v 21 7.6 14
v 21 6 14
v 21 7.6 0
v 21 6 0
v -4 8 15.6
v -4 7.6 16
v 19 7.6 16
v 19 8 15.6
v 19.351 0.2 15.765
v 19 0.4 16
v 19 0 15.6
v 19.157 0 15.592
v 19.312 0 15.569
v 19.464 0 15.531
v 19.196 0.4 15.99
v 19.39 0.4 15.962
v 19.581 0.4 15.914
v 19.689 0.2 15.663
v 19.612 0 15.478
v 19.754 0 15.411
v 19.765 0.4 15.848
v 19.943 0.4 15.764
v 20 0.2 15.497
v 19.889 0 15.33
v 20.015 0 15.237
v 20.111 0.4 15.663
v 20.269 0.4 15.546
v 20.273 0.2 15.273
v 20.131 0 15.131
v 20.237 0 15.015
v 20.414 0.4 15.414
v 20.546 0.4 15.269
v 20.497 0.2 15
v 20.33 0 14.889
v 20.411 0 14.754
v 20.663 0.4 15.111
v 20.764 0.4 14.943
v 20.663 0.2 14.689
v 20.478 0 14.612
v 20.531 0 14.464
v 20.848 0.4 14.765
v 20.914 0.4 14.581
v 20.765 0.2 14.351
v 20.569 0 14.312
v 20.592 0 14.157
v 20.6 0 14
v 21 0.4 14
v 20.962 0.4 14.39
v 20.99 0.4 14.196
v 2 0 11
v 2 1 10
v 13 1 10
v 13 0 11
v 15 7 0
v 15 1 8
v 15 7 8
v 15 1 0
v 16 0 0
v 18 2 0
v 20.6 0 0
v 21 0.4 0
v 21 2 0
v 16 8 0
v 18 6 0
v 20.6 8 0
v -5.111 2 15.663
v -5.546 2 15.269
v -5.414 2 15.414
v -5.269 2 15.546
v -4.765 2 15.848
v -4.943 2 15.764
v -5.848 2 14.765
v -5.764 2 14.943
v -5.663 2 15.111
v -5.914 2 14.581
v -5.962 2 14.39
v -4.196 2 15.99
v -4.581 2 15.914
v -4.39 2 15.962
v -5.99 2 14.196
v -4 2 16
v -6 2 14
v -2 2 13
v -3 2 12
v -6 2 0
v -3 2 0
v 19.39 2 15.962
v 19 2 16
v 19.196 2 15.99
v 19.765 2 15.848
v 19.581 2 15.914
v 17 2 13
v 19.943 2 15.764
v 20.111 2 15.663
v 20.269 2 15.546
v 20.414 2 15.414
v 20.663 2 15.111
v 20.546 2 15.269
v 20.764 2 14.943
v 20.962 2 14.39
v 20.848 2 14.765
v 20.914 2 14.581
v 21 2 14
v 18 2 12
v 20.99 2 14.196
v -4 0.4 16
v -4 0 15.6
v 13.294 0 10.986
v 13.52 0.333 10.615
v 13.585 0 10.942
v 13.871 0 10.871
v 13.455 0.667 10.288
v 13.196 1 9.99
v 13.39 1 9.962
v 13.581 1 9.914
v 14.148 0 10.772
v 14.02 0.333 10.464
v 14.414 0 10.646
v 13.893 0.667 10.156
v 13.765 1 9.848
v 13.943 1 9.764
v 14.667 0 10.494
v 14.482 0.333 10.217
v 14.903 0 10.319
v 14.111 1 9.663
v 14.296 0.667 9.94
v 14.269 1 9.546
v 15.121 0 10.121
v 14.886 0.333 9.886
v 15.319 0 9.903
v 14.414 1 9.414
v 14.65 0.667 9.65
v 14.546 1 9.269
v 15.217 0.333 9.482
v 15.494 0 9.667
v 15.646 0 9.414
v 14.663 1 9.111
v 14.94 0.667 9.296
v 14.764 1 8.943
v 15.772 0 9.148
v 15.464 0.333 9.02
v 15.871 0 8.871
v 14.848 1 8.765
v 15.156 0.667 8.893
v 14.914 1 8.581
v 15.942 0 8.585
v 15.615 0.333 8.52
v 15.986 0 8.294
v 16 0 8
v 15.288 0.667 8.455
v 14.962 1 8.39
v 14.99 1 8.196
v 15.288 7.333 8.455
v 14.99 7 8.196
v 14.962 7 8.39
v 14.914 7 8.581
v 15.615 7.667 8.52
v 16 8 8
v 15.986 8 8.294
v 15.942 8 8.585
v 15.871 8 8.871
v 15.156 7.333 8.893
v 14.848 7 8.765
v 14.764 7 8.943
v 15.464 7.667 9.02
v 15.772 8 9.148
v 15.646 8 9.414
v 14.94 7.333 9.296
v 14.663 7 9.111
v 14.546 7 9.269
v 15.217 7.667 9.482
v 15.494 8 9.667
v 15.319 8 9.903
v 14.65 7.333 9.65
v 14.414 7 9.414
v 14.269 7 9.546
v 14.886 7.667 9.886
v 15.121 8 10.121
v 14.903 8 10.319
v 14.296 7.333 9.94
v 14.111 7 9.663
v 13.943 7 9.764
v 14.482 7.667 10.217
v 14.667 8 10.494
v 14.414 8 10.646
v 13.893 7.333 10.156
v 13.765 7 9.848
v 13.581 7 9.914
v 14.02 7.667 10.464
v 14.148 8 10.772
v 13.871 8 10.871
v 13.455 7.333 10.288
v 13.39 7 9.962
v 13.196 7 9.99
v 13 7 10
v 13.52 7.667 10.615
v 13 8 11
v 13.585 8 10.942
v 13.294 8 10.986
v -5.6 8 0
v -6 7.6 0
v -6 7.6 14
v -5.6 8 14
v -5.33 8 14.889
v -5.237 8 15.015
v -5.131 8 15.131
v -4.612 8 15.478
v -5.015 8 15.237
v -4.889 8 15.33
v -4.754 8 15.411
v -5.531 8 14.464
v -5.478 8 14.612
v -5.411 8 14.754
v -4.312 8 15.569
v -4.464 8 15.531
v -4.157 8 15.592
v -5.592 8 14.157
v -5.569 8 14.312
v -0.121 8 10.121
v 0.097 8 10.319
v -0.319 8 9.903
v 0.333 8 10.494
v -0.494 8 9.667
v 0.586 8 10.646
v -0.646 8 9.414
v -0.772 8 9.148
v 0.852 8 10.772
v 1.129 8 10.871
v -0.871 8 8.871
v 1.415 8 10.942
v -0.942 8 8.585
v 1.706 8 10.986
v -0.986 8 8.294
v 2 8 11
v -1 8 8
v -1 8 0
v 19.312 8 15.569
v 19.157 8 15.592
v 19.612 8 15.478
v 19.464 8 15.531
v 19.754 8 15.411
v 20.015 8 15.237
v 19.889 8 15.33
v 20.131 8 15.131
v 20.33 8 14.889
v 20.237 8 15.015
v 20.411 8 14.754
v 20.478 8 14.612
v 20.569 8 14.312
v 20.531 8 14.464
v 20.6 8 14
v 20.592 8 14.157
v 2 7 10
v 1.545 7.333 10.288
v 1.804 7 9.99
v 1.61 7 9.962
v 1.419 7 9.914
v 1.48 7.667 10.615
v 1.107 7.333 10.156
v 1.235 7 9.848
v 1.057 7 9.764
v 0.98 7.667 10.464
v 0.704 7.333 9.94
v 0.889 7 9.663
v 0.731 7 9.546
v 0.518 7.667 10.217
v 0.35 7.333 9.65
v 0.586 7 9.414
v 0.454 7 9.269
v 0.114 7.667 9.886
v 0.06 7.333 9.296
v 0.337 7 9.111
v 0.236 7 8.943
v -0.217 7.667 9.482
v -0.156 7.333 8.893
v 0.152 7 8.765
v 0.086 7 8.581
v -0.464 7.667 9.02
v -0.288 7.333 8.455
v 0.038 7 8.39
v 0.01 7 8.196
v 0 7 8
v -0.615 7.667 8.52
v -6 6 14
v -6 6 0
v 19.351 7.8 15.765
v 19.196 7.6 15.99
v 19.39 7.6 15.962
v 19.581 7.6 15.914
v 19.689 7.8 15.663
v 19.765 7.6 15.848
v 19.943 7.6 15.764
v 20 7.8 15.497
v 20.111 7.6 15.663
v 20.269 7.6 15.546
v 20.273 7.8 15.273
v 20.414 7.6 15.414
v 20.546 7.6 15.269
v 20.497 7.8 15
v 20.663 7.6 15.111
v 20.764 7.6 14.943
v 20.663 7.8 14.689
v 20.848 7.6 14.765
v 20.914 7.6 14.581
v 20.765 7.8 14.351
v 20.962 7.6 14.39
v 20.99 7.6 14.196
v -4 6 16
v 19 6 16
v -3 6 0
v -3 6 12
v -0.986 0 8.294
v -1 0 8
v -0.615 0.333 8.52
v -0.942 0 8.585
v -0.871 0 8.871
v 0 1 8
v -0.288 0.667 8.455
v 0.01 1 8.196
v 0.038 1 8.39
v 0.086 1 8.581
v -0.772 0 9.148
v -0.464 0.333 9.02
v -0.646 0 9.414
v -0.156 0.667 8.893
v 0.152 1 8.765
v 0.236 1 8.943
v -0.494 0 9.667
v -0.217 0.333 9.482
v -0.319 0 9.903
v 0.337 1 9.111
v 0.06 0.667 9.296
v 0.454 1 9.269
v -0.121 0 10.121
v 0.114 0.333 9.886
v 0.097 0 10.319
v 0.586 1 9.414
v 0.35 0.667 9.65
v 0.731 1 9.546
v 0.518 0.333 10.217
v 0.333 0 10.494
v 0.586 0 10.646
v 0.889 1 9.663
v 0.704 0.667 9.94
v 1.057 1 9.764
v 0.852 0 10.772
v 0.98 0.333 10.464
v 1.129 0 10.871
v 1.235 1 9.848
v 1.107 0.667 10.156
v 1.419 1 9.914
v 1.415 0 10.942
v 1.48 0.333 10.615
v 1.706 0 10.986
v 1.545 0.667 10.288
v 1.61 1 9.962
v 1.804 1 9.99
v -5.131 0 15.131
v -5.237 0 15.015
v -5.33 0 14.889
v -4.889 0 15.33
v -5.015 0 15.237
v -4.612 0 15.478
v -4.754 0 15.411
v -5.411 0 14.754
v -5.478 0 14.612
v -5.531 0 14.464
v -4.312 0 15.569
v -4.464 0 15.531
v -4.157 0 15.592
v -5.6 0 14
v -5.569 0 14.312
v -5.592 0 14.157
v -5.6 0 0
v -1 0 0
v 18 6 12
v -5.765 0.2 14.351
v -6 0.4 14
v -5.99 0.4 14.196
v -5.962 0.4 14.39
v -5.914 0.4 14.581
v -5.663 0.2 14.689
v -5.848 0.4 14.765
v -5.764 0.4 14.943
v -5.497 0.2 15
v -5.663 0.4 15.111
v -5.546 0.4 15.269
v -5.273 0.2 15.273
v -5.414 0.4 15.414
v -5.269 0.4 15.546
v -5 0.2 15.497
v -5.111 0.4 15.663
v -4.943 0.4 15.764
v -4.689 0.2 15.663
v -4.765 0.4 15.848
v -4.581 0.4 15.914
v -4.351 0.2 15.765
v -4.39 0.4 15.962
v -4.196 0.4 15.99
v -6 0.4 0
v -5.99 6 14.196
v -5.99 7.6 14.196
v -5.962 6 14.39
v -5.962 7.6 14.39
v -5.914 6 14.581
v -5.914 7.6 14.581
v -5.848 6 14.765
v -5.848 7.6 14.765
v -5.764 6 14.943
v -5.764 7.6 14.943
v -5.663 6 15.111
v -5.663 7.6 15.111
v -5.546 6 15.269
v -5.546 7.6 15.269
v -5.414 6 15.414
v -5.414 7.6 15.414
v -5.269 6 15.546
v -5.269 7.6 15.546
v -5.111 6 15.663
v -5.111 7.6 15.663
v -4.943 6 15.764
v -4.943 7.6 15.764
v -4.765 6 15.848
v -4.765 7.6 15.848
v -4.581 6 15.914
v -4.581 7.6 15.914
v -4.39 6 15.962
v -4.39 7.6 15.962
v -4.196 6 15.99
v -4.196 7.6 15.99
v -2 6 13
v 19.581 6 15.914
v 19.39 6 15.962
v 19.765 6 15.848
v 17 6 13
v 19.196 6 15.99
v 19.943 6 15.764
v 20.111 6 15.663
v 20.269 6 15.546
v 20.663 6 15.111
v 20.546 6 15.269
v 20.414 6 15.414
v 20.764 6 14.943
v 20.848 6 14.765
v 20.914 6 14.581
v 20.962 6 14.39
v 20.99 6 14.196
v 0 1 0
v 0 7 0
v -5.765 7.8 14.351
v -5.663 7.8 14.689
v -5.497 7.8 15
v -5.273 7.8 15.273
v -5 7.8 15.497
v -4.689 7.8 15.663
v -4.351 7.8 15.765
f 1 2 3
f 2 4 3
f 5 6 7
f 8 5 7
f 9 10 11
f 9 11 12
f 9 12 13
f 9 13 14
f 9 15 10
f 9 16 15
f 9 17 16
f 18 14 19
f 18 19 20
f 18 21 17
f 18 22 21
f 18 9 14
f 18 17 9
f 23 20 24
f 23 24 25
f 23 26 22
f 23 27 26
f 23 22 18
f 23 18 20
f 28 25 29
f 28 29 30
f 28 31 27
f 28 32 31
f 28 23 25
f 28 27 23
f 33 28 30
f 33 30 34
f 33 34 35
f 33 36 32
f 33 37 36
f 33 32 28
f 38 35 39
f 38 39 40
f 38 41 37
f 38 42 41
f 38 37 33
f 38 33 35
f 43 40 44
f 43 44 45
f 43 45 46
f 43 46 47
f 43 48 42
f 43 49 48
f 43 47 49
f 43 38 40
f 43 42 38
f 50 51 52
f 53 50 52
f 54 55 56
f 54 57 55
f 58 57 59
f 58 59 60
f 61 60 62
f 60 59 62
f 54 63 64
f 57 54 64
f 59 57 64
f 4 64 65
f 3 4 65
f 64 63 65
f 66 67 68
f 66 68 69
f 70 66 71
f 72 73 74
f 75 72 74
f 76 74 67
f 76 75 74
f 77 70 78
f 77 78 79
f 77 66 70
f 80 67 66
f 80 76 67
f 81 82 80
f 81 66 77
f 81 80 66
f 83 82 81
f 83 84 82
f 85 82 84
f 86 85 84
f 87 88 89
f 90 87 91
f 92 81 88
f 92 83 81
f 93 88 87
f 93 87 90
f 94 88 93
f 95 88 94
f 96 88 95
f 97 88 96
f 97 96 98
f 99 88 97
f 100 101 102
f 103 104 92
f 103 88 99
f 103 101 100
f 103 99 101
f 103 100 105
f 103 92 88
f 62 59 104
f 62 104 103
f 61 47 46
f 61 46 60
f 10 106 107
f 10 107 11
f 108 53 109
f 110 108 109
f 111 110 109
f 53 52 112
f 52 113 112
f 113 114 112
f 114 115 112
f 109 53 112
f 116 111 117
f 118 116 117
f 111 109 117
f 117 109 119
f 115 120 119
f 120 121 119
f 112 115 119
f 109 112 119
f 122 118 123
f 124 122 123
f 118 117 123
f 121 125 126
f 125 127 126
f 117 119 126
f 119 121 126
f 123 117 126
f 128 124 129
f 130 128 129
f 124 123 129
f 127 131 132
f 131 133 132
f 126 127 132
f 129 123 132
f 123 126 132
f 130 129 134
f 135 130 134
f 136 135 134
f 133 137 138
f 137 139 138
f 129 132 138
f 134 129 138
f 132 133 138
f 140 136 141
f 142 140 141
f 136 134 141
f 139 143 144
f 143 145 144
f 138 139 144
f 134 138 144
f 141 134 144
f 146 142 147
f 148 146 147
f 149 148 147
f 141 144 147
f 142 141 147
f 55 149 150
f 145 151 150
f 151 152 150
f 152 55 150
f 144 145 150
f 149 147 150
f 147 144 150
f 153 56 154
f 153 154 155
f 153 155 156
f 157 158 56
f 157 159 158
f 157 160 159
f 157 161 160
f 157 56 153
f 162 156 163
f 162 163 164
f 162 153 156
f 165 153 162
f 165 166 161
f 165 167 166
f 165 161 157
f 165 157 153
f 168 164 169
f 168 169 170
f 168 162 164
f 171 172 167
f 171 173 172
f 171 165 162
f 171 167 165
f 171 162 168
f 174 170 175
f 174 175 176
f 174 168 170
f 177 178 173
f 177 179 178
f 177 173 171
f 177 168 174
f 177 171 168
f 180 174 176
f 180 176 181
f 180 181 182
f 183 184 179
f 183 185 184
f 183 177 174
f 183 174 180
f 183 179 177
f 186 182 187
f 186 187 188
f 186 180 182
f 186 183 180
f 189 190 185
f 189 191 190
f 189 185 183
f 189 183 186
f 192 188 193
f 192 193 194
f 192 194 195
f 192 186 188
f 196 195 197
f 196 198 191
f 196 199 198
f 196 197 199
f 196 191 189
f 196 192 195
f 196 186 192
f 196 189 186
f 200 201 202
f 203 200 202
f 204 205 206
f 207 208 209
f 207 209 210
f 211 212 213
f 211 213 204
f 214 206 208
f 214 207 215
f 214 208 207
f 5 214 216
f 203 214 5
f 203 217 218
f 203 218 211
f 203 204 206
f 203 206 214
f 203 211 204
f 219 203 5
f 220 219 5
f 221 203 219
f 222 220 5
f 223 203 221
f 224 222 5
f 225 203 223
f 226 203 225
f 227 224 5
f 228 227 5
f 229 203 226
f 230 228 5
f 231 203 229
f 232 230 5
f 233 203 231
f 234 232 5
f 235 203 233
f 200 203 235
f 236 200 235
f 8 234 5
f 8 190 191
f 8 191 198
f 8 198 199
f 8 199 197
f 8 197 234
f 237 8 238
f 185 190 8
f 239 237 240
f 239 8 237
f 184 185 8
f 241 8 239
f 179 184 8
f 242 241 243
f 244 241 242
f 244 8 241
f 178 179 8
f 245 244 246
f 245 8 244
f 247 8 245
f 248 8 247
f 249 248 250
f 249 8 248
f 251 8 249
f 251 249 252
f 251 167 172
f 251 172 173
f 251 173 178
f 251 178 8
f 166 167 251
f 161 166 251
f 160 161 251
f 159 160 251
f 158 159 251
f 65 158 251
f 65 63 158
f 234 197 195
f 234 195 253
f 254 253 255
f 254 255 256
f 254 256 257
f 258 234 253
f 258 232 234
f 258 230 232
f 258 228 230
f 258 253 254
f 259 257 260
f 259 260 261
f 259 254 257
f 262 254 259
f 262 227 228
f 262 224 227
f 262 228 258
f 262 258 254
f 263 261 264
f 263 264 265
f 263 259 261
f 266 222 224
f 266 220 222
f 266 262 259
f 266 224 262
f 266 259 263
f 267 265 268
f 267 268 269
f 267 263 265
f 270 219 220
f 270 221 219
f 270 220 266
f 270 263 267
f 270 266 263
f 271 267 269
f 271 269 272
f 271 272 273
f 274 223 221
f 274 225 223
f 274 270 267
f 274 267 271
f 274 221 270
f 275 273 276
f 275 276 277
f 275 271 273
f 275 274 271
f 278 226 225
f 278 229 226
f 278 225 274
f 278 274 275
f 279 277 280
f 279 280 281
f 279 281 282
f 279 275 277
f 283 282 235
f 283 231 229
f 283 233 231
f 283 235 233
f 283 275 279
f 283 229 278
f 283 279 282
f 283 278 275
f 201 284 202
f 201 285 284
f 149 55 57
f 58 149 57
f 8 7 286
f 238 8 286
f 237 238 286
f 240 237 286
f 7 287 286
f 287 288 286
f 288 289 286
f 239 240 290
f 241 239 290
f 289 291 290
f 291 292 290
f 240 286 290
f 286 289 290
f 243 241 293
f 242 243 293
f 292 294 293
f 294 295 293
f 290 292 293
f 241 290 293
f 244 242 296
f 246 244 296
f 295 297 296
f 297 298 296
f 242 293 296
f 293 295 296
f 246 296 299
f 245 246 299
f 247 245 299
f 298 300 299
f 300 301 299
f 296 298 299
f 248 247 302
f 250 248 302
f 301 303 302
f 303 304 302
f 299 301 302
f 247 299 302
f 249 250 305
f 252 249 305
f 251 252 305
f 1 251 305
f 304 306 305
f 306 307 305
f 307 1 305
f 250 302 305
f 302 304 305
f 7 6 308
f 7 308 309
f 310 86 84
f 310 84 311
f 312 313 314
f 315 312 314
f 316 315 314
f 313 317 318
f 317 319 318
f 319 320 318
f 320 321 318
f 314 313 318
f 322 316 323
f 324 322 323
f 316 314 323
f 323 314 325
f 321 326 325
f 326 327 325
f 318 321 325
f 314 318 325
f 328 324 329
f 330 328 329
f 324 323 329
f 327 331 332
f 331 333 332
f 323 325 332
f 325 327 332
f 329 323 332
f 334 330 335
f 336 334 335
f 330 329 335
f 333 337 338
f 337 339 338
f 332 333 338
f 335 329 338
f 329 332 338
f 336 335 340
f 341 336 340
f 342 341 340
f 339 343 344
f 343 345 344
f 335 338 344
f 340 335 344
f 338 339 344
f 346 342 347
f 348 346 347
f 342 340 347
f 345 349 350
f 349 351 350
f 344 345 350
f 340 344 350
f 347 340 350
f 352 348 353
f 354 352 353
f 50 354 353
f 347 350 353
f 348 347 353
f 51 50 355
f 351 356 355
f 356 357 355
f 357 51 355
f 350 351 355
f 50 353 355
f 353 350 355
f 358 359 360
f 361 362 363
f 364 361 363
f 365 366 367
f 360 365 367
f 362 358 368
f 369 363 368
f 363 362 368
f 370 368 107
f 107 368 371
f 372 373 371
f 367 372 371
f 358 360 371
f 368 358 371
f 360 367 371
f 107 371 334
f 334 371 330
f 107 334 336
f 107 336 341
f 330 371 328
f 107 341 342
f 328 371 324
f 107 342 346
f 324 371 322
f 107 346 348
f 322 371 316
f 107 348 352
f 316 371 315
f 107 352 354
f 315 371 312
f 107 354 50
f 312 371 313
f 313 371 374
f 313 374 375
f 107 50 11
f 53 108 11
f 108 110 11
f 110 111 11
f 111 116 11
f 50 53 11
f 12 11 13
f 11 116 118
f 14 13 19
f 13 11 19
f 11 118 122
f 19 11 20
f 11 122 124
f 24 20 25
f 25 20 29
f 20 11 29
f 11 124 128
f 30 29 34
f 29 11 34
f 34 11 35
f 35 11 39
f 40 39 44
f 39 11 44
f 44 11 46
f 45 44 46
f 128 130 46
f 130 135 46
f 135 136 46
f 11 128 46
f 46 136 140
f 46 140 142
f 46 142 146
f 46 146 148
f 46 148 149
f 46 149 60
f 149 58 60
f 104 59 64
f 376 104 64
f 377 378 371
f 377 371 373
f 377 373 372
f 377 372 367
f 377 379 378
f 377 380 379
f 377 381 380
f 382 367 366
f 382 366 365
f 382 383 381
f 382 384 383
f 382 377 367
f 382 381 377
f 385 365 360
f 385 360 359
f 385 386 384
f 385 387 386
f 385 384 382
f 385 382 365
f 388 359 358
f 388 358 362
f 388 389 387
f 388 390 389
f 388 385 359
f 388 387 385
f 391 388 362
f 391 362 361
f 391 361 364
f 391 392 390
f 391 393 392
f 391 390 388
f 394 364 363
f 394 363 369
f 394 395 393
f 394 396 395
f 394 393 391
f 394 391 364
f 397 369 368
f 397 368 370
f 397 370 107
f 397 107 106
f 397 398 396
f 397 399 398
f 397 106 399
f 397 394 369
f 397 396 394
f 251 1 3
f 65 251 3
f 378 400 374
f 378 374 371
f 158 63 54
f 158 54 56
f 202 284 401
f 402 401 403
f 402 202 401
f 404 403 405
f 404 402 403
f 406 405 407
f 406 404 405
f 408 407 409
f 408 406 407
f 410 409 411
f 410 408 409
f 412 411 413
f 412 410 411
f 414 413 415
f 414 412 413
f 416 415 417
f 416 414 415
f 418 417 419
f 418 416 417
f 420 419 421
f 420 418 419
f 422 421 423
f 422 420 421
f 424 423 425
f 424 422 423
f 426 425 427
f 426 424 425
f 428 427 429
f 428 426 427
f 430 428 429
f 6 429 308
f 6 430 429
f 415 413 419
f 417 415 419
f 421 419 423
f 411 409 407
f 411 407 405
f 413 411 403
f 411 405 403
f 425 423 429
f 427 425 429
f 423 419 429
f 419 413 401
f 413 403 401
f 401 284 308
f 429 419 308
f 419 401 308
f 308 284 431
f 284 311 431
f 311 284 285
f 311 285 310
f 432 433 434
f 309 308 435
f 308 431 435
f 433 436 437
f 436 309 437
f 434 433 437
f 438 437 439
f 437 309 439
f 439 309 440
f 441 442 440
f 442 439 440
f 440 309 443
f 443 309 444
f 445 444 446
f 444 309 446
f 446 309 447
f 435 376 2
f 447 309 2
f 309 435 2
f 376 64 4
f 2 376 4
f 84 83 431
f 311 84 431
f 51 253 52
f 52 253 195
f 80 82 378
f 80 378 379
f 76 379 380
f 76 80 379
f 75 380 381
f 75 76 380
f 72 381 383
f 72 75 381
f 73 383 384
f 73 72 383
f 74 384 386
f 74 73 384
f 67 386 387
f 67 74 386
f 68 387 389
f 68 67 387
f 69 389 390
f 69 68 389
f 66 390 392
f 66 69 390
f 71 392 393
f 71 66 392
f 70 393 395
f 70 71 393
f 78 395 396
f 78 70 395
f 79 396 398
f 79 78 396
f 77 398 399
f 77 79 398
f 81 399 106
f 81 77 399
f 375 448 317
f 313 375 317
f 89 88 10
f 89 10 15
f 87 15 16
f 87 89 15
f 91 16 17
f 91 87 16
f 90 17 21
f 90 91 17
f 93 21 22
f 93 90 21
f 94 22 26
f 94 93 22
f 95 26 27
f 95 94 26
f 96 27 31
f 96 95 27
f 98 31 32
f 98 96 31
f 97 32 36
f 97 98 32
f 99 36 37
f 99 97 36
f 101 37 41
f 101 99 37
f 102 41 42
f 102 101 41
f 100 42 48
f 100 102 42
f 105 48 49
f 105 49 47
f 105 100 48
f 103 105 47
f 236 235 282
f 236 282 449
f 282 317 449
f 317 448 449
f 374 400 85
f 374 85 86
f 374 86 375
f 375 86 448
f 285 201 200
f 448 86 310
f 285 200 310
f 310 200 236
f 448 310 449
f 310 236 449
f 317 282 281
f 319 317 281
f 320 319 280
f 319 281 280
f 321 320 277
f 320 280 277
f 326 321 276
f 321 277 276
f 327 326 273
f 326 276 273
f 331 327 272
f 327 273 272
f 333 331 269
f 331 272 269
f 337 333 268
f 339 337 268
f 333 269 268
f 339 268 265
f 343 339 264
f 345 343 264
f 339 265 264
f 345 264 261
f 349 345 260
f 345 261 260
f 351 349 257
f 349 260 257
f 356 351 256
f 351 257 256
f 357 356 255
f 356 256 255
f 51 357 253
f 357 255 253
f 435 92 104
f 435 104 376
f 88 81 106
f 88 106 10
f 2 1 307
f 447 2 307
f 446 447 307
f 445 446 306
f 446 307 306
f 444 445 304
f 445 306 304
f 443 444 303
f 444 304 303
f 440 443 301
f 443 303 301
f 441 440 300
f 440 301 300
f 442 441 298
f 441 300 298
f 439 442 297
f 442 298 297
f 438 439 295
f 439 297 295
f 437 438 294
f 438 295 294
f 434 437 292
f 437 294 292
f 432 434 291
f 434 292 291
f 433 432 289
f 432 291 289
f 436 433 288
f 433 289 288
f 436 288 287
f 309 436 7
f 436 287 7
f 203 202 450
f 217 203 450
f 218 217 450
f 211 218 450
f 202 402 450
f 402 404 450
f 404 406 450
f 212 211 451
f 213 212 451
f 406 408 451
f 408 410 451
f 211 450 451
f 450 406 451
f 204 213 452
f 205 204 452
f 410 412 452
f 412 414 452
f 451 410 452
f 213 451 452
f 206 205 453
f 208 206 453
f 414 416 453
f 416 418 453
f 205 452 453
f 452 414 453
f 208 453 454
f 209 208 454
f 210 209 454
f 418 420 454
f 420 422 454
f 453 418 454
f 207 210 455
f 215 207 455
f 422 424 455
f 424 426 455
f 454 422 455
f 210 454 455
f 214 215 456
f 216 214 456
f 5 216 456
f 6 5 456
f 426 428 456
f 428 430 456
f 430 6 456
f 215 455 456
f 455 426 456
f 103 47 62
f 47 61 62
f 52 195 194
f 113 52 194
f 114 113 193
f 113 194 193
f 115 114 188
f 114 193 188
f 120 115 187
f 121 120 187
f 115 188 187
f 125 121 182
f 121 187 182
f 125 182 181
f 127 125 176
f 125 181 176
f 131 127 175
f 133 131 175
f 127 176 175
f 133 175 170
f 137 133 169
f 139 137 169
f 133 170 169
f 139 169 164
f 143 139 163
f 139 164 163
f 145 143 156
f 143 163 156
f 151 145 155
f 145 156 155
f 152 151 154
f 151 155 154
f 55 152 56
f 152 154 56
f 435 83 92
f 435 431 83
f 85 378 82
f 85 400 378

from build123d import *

# Parameters (mm, degrees)
BOX004_W        = 21
BOX004_H        = 4
BOX004_DEPTH    = 10
BOX003_W        = 15
BOX003_H        = 4
BOX003_DEPTH    = 19
BOX_W           = 15
BOX_H           = 4
BOX_DEPTH       = 19
BOX002_W        = 15
BOX002_H        = 8
BOX002_DEPTH    = 10
BOX001_W        = 27
BOX001_H        = 8
BOX001_DEPTH    = 16
FILLET_R        = 2
FILLET001_R     = 2
CHAMFER_SIZE    = 1
CHAMFER001_SIZE = 1
CHAMFER002_SIZE = 0.4


with BuildPart() as cube004:
    # Box004 → Box004 (new body)
    with BuildSketch(Plane(origin=(-3, 2, 13), x_dir=(1, 0, 0), z_dir=(0, 0, 1))):
        with Locations((10.5, 2)):
            Rectangle(BOX004_W, BOX004_H)
    extrude(amount=BOX004_DEPTH)


with BuildPart() as cube003:
    # Box003 → Box003 (new body)
    with BuildSketch(Plane(origin=(18, 2, 0), x_dir=(1, 0, 0), z_dir=(0, 0, 1))):
        with Locations((7.5, 2)):
            Rectangle(BOX003_W, BOX003_H)
    extrude(amount=BOX003_DEPTH)


with BuildPart() as fusion:
    # Box → Box (new body)
    with BuildSketch(Plane(origin=(-18, 2, 0), x_dir=(1, 0, 0), z_dir=(0, 0, 1))):
        with Locations((7.5, 2)):
            Rectangle(BOX_W, BOX_H)
    extrude(amount=BOX_DEPTH)

    # Fusion: union Cube004, Cube003
    add(cube004.part)
    add(cube003.part)


with BuildPart() as cube002:
    # Box002 → Box002 (new body)
    with BuildSketch(Plane.XY):
        with Locations((7.5, 4)):
            Rectangle(BOX002_W, BOX002_H)
    extrude(amount=BOX002_DEPTH)


with BuildPart() as f_10x15_hole:
    # Box001 → Box001 (new body)
    with BuildSketch(Plane(origin=(-6, 0, 0), x_dir=(1, 0, 0), z_dir=(0, 0, 1))):
        with Locations((13.5, 4)):
            Rectangle(BOX001_W, BOX001_H)
    extrude(amount=BOX001_DEPTH)

    # Cut: cut Cube002
    add(cube002.part, mode=Mode.SUBTRACT)

    # Cut001: cut Fusion
    add(fusion.part, mode=Mode.SUBTRACT)

    # Fillet
    fillet_edges = [f_10x15_hole.edges().sort_by_distance(p)[0] for p in [
        (0, 4, 10),
        (15, 4, 10),
    ]]
    fillet(fillet_edges, radius=FILLET_R)

    # Fillet001
    fillet001_edges = [f_10x15_hole.edges().sort_by_distance(p)[0] for p in [
        (-6, 1, 16),
        (21, 1, 16),
        (-6, 7, 16),
        (21, 7, 16),
    ]]
    fillet(fillet001_edges, radius=FILLET001_R)

    # Chamfer
    chamfer_edges = [f_10x15_hole.edges().sort_by_distance(p)[0] for p in [
        (-3, 4, 13),
        (18, 4, 13),
    ]]
    chamfer(chamfer_edges, length=CHAMFER_SIZE)

    # Chamfer001
    chamfer001_edges = [f_10x15_hole.edges().sort_by_distance(p)[0] for p in [
        (15, 8, 4),
        (14.414214, 8, 9.414214),
        (7.5, 8, 10),
        (0.585786, 8, 9.414214),
        (0, 8, 4),
        (0, 0, 4),
        (15, 0, 4),
        (14.414214, 0, 9.414214),
        (7.5, 0, 10),
        (0.585786, 0, 9.414214),
    ]]
    chamfer(chamfer001_edges, length=CHAMFER001_SIZE)

    # Chamfer002
    chamfer002_edges = [f_10x15_hole.edges().sort_by_distance(p)[0] for p in [
        (-6, 8, 7),
        (-5.414214, 8, 15.414214),
        (7.5, 8, 16),
        (20.414214, 8, 15.414214),
        (21, 8, 7),
        (-6, 0, 7),
        (-5.414214, 0, 15.414214),
        (7.5, 0, 16),
        (20.414214, 0, 15.414214),
        (21, 0, 7),
    ]]
    chamfer(chamfer002_edges, length=CHAMFER002_SIZE)


solid = f_10x15_hole.part
